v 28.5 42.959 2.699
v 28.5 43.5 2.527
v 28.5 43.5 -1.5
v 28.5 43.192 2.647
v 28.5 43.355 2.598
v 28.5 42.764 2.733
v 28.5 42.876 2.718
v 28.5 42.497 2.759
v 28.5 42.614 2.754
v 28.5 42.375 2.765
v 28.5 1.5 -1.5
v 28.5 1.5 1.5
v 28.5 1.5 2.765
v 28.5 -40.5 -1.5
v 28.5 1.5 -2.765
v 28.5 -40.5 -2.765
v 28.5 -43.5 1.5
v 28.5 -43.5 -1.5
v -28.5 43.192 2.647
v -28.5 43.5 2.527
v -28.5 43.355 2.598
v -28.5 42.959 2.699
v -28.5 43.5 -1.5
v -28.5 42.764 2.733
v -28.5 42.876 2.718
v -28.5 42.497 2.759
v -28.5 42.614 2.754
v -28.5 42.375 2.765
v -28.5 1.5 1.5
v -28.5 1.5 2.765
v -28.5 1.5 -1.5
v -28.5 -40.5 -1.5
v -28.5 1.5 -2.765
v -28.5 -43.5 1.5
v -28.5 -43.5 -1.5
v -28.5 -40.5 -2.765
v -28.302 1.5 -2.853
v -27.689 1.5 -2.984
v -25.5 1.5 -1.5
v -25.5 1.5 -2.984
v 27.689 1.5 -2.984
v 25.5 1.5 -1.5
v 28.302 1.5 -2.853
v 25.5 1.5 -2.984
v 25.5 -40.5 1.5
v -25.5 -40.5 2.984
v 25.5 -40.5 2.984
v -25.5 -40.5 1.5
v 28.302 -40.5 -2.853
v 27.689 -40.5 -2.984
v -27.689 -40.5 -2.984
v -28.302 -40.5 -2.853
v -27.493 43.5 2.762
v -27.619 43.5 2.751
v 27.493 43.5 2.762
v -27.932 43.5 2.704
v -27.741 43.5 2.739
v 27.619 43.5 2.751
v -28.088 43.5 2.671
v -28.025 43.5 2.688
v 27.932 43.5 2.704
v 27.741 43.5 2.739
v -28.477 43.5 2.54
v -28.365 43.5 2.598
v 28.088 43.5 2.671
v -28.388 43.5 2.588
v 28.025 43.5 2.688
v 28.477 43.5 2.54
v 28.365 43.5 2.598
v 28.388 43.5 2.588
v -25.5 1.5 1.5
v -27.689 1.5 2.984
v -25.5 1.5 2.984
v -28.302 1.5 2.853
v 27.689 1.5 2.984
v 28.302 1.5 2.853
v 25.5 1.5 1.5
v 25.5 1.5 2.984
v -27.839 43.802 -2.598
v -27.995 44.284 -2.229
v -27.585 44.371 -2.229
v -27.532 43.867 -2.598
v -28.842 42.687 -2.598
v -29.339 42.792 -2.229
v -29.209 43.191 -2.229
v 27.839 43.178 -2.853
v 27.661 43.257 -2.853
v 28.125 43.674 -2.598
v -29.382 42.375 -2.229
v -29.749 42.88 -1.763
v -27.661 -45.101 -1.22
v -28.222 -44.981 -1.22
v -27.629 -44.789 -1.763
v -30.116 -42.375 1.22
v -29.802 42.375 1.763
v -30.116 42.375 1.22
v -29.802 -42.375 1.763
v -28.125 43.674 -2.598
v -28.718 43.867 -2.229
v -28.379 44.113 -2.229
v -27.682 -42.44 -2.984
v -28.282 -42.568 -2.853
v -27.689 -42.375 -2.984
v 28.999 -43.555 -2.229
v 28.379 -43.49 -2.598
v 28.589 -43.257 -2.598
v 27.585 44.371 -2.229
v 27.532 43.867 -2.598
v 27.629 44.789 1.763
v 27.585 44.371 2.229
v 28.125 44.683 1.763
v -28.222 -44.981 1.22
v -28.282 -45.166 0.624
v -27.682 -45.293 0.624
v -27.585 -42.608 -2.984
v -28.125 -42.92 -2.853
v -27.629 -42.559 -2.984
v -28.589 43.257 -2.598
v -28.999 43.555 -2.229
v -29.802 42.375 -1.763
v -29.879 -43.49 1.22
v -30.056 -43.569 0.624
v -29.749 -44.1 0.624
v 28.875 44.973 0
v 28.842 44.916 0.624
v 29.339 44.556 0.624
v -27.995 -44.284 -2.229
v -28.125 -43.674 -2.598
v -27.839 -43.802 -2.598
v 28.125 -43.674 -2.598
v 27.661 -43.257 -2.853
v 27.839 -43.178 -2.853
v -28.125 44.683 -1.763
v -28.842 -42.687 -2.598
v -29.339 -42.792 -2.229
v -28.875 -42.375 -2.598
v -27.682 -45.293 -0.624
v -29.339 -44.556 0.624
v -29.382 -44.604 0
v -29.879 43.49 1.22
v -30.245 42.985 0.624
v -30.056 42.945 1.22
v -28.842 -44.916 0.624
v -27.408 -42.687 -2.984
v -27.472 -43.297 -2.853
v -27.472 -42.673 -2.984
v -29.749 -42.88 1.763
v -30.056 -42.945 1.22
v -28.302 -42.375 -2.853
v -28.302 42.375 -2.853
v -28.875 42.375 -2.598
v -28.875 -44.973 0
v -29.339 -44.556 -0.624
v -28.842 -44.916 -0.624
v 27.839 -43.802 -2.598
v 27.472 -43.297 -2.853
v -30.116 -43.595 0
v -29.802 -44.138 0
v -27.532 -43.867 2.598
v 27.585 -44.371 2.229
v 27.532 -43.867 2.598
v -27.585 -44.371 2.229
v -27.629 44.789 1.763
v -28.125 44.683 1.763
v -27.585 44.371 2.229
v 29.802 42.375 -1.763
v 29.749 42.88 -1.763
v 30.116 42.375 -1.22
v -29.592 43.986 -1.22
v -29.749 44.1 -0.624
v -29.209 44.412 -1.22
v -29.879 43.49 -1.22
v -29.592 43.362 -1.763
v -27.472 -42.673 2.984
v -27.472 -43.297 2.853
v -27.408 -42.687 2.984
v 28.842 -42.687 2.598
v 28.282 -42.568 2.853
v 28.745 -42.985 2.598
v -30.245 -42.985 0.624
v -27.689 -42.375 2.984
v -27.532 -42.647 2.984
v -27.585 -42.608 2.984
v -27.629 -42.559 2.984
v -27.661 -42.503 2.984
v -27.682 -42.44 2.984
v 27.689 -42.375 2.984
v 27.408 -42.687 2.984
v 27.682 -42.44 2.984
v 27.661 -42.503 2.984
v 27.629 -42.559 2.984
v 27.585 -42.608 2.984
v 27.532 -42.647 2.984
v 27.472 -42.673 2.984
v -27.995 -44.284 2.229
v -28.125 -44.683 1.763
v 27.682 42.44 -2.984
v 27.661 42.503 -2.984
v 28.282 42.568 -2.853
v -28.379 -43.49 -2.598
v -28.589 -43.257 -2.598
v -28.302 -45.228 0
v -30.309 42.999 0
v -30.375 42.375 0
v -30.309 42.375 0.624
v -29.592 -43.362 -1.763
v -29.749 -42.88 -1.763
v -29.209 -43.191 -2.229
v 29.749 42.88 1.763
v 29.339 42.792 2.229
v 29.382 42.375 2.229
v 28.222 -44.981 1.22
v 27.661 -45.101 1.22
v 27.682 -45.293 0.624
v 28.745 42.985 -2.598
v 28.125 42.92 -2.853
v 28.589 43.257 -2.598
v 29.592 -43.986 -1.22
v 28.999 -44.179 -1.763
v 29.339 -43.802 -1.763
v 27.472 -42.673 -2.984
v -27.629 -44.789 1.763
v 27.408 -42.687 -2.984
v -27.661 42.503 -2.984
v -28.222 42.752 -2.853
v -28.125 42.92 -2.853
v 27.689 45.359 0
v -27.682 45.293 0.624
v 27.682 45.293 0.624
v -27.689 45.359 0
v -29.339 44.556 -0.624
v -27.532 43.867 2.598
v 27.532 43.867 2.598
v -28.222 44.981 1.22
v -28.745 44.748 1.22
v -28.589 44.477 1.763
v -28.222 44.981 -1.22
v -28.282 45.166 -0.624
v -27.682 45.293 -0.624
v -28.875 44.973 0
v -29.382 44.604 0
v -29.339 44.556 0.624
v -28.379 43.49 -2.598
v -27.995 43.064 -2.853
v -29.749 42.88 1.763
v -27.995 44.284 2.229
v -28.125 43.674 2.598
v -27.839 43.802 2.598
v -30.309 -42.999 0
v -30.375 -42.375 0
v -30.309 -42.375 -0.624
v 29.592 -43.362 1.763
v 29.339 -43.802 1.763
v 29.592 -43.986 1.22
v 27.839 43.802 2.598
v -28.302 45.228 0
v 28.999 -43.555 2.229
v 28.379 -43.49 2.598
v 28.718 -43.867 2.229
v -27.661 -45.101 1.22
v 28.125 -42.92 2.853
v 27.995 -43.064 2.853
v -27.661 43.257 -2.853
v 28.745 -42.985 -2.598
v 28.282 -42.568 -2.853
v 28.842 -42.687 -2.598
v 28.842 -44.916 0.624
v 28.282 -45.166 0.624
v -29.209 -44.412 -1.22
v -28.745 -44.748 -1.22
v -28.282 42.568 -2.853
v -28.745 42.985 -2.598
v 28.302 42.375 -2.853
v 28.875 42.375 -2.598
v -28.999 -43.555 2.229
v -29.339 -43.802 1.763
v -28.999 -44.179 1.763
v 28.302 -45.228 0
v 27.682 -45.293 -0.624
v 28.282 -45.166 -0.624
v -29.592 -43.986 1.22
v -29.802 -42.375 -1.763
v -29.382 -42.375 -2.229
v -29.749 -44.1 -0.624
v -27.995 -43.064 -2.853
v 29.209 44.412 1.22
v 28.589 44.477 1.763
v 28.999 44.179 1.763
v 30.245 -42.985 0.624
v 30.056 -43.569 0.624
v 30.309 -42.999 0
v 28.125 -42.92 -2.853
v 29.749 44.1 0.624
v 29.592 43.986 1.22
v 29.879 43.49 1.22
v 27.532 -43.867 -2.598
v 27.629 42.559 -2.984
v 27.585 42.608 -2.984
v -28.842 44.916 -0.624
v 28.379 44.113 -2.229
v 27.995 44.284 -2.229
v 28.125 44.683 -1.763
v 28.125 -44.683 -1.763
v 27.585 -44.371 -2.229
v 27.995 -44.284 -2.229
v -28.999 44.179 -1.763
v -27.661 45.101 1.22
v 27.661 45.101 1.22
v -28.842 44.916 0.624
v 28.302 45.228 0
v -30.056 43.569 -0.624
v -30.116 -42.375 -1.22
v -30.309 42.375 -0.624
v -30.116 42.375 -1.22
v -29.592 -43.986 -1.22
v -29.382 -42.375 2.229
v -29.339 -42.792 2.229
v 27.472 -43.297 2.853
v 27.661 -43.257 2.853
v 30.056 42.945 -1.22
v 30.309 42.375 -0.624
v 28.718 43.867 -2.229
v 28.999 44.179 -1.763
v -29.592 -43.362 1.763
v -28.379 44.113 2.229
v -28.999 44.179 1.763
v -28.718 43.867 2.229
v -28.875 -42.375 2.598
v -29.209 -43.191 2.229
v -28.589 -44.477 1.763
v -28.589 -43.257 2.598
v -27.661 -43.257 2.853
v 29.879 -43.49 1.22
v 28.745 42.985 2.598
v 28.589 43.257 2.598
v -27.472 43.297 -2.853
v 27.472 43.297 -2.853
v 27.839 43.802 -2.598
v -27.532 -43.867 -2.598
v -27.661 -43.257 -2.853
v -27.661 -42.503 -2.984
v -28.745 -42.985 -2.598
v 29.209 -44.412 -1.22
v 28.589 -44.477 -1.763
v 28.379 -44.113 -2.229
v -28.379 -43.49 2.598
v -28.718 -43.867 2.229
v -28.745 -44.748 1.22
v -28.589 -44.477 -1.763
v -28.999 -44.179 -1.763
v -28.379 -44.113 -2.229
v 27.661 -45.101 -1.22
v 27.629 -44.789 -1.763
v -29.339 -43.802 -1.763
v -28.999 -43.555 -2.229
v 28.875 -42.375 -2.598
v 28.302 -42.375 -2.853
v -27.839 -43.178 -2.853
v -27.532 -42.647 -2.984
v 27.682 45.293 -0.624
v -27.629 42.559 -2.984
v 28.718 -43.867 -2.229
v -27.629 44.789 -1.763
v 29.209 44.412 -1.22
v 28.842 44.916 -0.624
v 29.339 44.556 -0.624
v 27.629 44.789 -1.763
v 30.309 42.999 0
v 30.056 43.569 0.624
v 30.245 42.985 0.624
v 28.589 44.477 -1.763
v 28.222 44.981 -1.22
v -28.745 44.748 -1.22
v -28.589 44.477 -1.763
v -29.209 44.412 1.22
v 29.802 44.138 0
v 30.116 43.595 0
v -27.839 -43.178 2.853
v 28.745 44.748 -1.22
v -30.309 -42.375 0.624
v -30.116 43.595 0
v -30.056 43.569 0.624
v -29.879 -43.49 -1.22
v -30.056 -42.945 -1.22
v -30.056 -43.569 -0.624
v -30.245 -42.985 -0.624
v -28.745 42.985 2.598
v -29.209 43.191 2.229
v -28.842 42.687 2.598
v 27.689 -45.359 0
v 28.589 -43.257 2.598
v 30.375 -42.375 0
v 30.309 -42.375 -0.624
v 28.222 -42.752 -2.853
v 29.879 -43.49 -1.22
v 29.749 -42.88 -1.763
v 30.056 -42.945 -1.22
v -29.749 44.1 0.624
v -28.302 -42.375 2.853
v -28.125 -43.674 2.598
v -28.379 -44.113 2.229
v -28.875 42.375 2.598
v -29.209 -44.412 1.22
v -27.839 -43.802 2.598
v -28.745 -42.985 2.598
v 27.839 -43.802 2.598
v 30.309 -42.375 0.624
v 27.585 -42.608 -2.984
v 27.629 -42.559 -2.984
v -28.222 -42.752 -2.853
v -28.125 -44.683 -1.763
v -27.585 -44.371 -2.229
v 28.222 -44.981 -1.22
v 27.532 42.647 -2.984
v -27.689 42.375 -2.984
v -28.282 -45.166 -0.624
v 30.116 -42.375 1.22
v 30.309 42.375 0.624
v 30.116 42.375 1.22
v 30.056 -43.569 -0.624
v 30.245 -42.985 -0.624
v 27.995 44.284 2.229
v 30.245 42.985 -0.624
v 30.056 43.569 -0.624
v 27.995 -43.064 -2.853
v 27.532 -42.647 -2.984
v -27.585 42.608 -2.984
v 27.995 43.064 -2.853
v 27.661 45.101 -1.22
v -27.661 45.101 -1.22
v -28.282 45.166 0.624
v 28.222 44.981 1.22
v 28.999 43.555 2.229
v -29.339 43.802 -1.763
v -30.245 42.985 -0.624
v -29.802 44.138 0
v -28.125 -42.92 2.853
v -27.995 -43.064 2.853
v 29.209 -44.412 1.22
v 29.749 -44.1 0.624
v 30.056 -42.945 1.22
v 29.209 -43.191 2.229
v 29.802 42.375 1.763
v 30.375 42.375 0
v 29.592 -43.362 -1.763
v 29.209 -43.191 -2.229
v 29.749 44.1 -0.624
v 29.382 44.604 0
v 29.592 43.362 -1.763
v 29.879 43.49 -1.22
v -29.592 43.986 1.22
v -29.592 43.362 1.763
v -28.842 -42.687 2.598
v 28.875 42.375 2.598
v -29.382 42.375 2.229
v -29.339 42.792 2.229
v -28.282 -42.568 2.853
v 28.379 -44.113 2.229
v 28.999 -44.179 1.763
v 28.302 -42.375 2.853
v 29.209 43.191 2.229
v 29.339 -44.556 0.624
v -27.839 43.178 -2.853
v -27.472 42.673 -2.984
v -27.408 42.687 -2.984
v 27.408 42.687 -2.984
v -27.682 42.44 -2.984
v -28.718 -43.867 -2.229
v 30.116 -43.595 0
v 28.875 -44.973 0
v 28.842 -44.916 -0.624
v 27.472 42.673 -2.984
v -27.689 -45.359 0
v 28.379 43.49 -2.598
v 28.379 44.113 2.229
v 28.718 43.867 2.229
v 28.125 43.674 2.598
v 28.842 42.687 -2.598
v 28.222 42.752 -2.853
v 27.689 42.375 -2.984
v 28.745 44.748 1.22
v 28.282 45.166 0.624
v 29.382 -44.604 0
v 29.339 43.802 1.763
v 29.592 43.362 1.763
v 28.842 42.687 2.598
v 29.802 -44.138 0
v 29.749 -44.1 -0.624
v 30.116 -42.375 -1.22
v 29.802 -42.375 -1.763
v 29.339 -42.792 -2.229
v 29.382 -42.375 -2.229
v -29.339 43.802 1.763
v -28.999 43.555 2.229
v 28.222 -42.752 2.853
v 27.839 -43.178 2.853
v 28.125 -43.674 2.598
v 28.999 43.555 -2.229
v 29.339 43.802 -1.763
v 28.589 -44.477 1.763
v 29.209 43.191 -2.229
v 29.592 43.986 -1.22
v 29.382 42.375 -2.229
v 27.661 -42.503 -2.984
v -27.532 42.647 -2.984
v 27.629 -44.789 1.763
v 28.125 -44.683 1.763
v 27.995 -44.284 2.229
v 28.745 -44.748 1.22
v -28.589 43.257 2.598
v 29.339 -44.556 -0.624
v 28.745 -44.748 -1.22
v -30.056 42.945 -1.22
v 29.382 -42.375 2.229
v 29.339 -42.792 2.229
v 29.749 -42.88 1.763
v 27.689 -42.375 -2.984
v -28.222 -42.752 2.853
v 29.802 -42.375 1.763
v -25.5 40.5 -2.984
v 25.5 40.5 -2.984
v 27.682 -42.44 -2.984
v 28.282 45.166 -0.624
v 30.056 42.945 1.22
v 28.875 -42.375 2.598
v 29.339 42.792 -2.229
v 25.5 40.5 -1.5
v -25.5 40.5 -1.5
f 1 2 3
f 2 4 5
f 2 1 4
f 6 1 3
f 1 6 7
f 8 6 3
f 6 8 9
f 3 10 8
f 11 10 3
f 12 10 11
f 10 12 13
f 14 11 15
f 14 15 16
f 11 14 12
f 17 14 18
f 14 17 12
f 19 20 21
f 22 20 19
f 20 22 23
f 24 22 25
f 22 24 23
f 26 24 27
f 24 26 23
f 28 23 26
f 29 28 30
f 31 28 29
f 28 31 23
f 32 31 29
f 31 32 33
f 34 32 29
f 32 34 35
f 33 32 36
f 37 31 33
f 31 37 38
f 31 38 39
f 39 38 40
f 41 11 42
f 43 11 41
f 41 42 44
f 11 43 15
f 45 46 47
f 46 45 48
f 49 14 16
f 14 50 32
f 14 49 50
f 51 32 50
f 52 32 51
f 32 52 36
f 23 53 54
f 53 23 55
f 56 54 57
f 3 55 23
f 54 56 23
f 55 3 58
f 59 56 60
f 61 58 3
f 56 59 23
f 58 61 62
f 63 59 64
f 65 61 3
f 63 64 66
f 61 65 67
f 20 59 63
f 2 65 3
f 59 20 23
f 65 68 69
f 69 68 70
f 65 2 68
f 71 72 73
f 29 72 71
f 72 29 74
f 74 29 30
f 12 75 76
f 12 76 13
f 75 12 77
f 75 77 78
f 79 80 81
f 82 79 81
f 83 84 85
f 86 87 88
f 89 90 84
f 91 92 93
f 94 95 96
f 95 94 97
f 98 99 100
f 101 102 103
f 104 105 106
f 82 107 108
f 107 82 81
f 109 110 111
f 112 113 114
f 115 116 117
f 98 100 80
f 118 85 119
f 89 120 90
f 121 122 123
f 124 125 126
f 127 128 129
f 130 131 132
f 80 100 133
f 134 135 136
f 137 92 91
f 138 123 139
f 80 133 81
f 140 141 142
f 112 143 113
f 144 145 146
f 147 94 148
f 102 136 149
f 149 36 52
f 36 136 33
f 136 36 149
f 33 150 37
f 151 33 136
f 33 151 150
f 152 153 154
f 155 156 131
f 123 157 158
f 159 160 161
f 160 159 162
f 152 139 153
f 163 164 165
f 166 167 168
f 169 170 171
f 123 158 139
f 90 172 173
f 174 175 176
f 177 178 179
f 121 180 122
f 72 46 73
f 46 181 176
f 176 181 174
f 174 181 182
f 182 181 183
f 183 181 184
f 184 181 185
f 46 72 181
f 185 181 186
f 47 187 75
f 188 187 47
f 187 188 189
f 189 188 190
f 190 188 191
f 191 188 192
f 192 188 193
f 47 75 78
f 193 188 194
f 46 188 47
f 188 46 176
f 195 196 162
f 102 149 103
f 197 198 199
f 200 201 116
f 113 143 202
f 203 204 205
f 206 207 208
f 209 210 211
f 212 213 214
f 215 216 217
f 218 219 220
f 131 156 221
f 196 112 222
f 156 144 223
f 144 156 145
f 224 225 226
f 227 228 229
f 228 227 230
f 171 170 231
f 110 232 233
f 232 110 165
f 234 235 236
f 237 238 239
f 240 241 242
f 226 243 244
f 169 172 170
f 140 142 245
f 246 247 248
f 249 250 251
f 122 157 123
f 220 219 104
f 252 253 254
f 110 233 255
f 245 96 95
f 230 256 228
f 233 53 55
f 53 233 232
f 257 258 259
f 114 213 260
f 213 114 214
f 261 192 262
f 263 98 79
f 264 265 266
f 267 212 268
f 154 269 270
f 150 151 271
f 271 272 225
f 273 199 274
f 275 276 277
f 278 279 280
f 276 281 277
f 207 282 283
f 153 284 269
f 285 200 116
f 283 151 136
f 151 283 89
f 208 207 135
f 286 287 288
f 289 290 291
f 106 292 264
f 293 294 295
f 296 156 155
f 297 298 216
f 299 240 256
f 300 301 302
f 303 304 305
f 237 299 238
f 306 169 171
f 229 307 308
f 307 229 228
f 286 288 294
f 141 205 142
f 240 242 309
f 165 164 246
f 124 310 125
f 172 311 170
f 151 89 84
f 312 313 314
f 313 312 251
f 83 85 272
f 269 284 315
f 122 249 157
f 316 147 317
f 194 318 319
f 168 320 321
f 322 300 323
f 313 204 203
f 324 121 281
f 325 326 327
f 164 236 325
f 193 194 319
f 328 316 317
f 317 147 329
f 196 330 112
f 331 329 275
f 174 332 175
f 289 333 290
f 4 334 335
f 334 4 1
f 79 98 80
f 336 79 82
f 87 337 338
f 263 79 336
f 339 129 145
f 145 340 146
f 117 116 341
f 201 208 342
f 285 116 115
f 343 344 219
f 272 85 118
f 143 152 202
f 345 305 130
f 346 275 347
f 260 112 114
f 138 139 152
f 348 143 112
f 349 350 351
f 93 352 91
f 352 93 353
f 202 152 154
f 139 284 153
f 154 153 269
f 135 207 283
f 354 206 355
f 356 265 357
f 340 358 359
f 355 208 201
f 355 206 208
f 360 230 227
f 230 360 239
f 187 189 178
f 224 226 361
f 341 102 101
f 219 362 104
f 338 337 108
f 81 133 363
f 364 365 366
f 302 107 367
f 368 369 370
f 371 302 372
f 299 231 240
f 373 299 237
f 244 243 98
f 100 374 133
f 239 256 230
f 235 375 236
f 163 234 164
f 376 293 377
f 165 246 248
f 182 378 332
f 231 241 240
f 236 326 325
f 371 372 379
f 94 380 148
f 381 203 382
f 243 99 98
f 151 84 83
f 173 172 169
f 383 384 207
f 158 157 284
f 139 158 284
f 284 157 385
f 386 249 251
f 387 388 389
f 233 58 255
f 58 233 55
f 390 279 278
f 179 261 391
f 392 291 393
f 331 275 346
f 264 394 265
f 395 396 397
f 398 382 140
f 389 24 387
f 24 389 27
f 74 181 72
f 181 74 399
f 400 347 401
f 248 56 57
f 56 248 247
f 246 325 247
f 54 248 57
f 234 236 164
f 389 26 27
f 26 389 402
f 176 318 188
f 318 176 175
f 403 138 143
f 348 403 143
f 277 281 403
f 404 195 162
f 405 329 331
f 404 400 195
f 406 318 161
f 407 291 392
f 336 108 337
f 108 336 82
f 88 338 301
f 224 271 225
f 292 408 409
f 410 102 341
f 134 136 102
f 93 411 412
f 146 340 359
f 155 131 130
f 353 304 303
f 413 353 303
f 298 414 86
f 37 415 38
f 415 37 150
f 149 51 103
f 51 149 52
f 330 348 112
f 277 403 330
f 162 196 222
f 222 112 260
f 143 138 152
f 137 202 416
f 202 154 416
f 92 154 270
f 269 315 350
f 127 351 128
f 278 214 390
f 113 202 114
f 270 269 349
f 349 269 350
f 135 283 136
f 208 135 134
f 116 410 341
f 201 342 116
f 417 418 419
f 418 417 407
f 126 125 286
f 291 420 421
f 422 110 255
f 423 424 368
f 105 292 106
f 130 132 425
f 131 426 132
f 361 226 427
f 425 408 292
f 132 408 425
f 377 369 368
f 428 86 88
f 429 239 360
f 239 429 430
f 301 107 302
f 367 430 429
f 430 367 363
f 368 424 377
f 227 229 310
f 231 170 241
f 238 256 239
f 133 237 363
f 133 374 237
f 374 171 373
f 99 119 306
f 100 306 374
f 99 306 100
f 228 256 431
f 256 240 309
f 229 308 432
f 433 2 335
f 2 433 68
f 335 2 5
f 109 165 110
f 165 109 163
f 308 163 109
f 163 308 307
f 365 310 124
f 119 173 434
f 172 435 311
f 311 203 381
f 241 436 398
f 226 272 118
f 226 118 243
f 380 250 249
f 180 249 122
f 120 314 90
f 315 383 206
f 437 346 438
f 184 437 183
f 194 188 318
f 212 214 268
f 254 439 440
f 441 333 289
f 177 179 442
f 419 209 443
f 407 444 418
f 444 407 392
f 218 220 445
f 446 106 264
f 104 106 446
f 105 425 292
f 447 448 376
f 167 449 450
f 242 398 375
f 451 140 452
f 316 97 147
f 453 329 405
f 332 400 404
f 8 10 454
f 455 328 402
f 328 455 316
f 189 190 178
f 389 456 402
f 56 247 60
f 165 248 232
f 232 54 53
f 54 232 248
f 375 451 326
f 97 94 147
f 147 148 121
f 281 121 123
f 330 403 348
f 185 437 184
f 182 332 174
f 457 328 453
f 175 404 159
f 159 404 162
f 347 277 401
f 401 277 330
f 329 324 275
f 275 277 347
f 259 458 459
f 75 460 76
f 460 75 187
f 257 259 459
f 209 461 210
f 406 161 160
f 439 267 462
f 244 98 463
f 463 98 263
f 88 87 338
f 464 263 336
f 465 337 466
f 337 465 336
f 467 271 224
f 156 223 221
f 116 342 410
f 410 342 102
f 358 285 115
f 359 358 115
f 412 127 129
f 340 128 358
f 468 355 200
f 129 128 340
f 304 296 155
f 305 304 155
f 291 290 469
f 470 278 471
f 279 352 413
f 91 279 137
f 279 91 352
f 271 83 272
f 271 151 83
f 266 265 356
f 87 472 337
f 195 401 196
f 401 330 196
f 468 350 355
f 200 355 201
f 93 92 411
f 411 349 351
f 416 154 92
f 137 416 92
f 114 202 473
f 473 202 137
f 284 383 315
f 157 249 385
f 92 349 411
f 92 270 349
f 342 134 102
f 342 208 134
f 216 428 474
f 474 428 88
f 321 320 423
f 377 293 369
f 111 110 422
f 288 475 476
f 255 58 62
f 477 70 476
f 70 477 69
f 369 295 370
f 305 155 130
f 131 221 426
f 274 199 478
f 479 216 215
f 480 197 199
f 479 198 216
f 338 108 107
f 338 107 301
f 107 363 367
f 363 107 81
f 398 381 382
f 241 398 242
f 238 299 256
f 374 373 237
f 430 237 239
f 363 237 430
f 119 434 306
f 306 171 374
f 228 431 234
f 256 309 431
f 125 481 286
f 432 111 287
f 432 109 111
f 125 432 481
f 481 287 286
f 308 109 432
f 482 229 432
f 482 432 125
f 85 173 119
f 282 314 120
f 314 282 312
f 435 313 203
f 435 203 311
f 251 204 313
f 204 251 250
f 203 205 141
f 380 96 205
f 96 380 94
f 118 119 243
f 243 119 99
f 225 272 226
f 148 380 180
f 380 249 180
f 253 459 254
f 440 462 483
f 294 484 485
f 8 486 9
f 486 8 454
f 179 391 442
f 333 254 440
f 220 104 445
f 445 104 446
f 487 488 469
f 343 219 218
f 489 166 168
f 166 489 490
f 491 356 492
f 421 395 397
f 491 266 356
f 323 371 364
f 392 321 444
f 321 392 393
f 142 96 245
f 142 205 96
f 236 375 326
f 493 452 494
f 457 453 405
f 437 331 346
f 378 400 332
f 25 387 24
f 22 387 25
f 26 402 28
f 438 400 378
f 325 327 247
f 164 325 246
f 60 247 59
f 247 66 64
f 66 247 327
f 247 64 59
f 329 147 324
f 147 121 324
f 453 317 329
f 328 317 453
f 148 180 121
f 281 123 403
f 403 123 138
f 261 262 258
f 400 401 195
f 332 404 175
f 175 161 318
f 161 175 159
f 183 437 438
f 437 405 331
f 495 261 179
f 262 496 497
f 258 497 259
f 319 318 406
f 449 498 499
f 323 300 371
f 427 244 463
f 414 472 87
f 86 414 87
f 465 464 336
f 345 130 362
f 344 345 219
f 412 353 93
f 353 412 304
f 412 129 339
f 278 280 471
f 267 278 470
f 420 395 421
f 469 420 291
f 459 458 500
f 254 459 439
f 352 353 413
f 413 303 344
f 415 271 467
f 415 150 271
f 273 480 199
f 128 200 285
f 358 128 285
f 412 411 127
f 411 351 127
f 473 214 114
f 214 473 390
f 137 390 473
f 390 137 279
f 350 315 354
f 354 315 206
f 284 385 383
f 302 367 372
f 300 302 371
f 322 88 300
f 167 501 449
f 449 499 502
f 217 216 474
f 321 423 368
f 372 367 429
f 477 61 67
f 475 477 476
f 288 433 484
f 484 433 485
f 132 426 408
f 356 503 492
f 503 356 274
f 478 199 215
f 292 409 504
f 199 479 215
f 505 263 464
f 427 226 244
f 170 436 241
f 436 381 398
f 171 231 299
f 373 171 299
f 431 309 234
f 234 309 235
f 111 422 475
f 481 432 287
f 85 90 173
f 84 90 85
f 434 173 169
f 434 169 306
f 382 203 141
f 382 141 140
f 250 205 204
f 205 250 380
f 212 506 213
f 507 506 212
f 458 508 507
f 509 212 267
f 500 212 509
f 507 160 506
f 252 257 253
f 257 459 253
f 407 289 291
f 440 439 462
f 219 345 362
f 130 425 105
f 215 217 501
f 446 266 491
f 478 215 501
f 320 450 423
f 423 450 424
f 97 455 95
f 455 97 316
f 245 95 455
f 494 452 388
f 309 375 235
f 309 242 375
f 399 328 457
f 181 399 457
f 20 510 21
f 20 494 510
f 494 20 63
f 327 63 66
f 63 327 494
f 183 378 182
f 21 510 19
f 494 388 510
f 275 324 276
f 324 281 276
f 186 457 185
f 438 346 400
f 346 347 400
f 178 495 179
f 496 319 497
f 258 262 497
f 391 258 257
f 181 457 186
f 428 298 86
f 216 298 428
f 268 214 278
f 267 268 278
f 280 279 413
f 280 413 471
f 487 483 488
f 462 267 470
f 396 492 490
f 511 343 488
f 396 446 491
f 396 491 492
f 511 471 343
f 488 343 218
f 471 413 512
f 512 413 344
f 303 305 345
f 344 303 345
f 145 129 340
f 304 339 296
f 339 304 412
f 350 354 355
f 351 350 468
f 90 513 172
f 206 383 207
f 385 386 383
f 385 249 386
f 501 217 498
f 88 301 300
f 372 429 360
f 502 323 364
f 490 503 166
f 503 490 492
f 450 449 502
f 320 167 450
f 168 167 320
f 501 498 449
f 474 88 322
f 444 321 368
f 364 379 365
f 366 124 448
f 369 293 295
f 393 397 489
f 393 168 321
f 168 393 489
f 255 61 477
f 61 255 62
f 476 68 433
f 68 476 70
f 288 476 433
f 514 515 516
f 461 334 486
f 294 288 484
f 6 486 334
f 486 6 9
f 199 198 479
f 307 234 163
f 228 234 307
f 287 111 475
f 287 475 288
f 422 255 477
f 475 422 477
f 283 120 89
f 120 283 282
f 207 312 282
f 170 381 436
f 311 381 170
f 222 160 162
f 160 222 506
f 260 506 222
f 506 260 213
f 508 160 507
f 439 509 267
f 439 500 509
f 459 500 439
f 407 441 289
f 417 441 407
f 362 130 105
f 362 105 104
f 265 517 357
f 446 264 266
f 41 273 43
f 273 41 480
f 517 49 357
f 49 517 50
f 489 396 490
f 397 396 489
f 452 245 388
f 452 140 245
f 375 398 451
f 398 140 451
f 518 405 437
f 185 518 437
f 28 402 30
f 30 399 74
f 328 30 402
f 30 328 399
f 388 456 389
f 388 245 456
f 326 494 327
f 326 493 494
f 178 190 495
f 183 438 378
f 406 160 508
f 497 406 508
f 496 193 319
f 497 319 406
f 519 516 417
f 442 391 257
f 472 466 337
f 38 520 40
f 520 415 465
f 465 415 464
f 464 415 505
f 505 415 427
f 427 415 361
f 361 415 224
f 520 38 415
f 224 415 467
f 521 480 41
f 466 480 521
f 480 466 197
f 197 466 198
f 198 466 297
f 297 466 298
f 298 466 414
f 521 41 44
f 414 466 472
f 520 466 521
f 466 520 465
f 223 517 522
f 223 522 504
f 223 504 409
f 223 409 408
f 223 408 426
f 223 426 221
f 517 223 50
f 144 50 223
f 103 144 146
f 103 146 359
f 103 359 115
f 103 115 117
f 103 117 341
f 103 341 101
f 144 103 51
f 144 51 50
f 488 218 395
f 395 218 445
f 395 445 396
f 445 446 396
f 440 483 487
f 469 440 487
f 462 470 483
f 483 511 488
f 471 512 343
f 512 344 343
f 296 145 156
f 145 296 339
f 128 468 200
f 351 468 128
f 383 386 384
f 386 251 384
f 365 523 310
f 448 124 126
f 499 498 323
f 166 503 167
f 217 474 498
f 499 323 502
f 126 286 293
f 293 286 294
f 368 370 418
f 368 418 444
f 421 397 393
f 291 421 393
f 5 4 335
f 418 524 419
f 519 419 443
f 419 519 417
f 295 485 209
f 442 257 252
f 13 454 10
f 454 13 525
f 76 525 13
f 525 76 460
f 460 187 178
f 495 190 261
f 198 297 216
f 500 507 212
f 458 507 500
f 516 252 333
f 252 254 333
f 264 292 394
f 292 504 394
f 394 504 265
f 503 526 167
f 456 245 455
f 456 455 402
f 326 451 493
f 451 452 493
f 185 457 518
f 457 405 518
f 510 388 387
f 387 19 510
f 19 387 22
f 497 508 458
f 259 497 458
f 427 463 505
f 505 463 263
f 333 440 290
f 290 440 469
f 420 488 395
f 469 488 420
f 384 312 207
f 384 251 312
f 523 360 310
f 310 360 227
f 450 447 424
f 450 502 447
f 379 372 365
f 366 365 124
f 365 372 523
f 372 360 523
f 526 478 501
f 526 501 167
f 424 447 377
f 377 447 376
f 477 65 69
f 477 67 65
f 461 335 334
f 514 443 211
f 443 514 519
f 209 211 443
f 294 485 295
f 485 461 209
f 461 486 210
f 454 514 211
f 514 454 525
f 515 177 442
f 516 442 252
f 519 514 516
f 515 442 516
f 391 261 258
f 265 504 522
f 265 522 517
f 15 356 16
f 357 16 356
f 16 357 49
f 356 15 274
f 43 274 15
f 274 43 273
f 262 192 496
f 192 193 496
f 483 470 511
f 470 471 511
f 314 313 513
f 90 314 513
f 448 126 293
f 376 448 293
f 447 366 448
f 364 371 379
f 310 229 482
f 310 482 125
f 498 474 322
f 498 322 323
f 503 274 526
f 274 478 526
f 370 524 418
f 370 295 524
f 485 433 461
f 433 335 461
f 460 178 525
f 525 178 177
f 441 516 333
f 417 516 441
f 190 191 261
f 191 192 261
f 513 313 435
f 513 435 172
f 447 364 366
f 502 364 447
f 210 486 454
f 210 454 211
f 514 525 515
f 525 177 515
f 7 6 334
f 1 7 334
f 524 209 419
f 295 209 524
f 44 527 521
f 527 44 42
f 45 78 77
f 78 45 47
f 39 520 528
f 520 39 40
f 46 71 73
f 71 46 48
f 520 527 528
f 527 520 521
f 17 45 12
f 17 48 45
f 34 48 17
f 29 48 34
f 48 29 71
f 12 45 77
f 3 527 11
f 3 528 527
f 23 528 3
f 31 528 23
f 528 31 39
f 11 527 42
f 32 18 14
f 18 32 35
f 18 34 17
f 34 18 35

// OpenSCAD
// Badge dimensions.
badge_width = 55;  // mm.
badge_height = 86;  // mm.
badge_depth = 2.5;  // mm. thickness of badge.

// Shapeways model tolerance.
// Stainless steel edges must be at least 1.5 mm thick.
tolerance = 1.5; // mm.

margin = 2; // mm
slide_length = 0; // mm
extra_slot = 3; // mm

// Window is the empty area that makes the badge visible. To hold badge in
// place the window should be *smaller* than the actual badge dimensions.
// Cover left & right, and top & bottom by 'tolerance' mm.
window_width = badge_width - 2*margin;
window_height = badge_height - margin - slide_length - extra_slot;
// window_depth is assigned below.

// Slot is the inner gap where the badge will slide into frame.
// The slot should be *slightly* larger than the badge, with space on the top for it to slide out.
// Add 1mm on left & right, and top & bottom.
slot_width = badge_width + 2;
slot_height = badge_height + slide_length + 1;
slot_depth = badge_depth + 0.5;  // pretty tight. but should be enough.

// Size of the two openings for inserting the badge
opening_width = slot_width;
opening_height = (slot_height - slide_length - extra_slot) / 2;
opening_depth = tolerance + 0.2;

// Outside is the external dimension of the entire frame.
// The additional padding (.75) is for volume lost by the beveled edges.
// Add tolerance on left & right, top & bottom.
outside_width = slot_width + 2*tolerance + 0.75;
outside_height = slot_height + 2*tolerance + 0.75;
outside_depth = slot_depth + 2*tolerance;  // the bare minimum wall size.

// Now that we have defined outside_depth, we can assign window_depth.
// Make window_depth a little larger to guarantee a complete removal of frame
// without aliasing due to floating point precision.
window_depth = outside_depth + 0.1;

// Creates a "beveled cube" of dimensions width x height x depth with beveled
// edges of radius depth/2. All dimensions are preserved, but volume is less
// due to beveled edges. The entire shape is centered at the origin: 0, 0, 0.
module beveledcube(width, height, depth) {
  r = depth/2;
  // Set local w and h so that given width and height are preserved.
  w = width - depth;  // radius will be added twice on left and right.
  h = height - depth;  // radius will be added twice on top and bottom.

  // creates a convex hull around these four spheres.
  hull() {
    translate([-w/2, -h/2, 0]) sphere(r, $fs=0.01);
    translate([ w/2, -h/2, 0]) sphere(r, $fs=0.01);
    translate([-w/2,  h/2, 0]) sphere(r, $fs=0.01);
    translate([ w/2,  h/2, 0]) sphere(r, $fs=0.01);
  }
}

// Creates a "cylinder cube" of dimensions width x height x depth with beveled
// edges of radius depth/2 only on the width and height dimensions. All
// dimensions are preserved, but volume is less due to beveled edges. The
// entire shape is centered at the origin: 0, 0, 0.
module cylindercube(width, height, depth) {
  r = depth/2;
  // Set local w and h so that given width and height are preserved.
  w = width - depth;  // radius will be added twice on left and right.
  h = height - depth;  // radius will be added twice on top and bottom.

  // creates a convex hull around these four spheres.
  hull() {
    translate([-w/2, -h/2, 0]) cylinder(h=depth, r=r, center=true, $fs=0.01);
    translate([ w/2, -h/2, 0]) cylinder(h=depth, r=r, center=true, $fs=0.01);
    translate([-w/2,  h/2, 0]) cylinder(h=depth, r=r, center=true, $fs=0.01);
    translate([ w/2,  h/2, 0]) cylinder(h=depth, r=r, center=true, $fs=0.01);
  }
}

module ring_holes(ring_radius, wire_radius, depth) {
  offset = ring_radius * 0.6;
  hole_radius = wire_radius * 1.1;
  translate([-offset, hole_radius, 0]) cylinder(h=depth, r=hole_radius, center=true, $fs=0.01);
  translate([offset, hole_radius, 0]) cylinder(h=depth, r=hole_radius, center=true, $fs=0.01);
}

// Logically, the badge holder consists of three intersecting shapes.
// 1) The 'badgeframe' defines the volume of the entire frame.
// 2) The window cylindercube is subtracted from the badgeframe shape
//    to create a portal to view the badge.
// 3) The slot cube is subtracted from within the badgeframe to
//    create a space for the badge to fit.

scale=1.25;
difference() {
  // outside shape.
  beveledcube(outside_width, outside_height, outside_depth);

  // cut out the viewing window from the center.
  cube([window_width, window_height, window_depth], center=true);

  // cut out the slot within the frame.
  cube(size = [slot_width,slot_height,slot_depth], center=true);

  translate([0, (slide_length+extra_slot)/2, 0]) {

    // cut out the lower opening for insertion
    translate([0,-opening_height/2,-(slot_depth/2+opening_depth/2-0.1)]) {
      cube(size = [opening_width, opening_height, opening_depth], center=true);
    }

    // cut out the upper opening for insertion
    translate([0,opening_height/2,slot_depth/2+opening_depth/2-0.1]) {
      cube(size = [opening_width, opening_height, opening_depth], center=true);
    }

  }
  
//  translate([0,window_height/2+margin,-(slot_depth/2+opening_depth/2-0.1)]) {
//    ring_holes(8.5,1.5,opening_depth);
//  }
}
